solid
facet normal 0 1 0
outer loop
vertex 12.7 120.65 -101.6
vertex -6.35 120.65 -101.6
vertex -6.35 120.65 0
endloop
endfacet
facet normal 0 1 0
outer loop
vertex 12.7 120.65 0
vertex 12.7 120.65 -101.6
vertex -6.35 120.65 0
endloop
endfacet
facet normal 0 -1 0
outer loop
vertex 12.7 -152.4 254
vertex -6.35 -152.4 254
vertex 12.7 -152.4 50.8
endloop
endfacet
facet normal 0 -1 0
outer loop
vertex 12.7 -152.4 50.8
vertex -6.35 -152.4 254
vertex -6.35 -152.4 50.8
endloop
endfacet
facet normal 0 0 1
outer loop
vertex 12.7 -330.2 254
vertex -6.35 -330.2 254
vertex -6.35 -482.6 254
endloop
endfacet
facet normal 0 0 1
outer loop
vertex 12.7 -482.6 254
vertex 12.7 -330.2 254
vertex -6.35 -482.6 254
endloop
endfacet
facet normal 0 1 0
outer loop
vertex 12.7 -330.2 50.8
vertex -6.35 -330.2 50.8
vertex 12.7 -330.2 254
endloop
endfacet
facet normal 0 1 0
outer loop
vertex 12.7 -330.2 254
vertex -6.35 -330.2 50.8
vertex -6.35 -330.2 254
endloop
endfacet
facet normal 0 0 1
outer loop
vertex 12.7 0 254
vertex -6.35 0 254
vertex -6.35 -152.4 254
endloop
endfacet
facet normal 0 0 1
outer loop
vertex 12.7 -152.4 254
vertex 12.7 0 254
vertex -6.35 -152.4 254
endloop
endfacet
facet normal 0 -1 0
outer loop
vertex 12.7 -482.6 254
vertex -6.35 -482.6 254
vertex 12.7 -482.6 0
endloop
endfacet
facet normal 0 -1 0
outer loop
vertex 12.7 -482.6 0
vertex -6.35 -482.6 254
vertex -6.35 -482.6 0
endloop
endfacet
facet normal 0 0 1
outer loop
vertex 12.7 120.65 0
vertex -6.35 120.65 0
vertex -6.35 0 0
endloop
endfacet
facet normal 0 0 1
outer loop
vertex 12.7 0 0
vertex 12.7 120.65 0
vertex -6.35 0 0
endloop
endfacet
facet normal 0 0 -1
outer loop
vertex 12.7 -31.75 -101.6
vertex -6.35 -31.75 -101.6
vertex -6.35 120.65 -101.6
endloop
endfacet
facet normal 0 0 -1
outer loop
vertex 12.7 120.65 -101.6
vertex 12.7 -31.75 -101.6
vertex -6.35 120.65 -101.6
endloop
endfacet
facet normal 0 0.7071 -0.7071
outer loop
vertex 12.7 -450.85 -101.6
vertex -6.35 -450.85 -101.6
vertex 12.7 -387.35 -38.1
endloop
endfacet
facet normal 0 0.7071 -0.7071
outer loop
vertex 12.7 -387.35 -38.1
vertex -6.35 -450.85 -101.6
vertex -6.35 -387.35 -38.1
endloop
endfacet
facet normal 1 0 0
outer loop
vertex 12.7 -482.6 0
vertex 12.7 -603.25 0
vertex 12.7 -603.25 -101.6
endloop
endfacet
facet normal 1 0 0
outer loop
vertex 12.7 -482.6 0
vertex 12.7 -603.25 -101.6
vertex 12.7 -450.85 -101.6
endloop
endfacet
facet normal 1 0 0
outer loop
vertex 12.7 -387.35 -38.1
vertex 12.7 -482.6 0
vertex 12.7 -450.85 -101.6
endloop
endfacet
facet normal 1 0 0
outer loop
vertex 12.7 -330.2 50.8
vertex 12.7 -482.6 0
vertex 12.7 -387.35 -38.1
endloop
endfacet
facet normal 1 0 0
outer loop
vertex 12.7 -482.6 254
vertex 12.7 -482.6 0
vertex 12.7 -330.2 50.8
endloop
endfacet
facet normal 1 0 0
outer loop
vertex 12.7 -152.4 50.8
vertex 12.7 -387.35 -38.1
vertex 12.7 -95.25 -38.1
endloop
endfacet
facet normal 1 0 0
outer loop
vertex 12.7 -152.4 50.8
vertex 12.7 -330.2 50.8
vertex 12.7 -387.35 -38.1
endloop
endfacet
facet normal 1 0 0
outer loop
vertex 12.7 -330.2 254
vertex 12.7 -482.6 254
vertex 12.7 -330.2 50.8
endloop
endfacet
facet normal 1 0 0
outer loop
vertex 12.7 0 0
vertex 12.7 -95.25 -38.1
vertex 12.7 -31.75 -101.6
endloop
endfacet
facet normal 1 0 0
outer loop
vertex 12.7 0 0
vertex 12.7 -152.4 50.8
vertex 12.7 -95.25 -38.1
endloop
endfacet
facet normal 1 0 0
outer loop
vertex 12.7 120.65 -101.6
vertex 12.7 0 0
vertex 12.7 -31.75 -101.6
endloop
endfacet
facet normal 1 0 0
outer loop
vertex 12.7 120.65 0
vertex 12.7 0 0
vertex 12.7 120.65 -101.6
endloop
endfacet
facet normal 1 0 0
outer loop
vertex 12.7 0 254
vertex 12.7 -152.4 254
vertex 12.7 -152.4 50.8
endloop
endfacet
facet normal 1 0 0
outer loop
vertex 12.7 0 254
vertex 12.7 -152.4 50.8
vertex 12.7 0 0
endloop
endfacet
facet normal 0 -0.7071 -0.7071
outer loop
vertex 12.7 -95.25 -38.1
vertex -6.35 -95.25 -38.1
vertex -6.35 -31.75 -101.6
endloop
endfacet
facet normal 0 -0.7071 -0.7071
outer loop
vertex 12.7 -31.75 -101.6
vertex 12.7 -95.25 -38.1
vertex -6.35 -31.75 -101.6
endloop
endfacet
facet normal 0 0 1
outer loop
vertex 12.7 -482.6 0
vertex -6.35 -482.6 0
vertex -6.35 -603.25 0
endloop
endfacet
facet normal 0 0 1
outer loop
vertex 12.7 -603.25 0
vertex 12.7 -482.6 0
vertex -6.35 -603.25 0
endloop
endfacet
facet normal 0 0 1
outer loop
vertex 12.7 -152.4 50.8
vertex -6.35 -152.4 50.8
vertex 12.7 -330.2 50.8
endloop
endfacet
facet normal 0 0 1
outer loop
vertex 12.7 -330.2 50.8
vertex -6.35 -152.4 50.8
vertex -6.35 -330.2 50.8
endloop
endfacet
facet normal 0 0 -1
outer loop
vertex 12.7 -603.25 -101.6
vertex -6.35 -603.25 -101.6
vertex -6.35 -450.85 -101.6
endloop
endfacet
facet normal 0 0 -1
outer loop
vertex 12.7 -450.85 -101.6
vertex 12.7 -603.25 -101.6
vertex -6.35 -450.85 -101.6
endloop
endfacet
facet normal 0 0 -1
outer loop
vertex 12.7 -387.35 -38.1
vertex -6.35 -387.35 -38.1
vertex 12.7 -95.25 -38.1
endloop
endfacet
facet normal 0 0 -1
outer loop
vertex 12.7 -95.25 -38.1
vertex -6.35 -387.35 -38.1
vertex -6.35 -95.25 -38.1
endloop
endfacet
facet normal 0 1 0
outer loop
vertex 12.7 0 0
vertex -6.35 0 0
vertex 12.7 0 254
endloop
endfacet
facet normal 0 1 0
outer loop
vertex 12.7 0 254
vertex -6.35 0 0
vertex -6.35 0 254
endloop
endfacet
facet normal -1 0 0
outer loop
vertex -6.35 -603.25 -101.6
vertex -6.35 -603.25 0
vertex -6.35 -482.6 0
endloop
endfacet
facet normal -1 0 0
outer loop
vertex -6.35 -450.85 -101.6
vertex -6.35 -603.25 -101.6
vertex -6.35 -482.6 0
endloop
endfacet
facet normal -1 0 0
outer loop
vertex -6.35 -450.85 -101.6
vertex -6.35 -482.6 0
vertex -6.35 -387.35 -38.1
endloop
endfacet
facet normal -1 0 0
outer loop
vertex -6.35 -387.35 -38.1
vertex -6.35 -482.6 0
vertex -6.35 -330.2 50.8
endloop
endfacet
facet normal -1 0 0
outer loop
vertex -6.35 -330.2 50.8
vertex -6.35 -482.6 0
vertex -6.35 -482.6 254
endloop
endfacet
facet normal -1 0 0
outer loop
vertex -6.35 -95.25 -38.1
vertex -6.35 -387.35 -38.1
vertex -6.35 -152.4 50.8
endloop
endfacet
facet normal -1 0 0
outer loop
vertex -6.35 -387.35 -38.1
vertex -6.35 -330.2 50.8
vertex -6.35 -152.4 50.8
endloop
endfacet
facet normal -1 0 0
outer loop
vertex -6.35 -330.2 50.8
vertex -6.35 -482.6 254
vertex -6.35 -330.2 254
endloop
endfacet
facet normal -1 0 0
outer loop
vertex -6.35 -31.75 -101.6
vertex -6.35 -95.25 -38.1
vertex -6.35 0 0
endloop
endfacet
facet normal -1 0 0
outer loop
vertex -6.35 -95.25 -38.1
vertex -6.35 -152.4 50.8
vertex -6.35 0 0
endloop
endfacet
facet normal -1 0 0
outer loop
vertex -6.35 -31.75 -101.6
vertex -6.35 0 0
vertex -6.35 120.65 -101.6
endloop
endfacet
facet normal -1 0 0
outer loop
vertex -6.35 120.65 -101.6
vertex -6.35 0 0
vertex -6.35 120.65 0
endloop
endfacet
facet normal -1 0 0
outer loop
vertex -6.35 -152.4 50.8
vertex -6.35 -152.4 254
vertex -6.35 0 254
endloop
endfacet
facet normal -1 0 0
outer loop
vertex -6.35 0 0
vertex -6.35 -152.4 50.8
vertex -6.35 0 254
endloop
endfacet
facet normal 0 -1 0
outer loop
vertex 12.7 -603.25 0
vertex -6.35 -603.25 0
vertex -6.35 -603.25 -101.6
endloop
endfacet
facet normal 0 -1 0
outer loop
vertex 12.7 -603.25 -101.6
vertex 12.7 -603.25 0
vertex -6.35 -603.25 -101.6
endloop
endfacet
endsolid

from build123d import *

# Parameters (mm, degrees)
F1_DEPTH = 6.35
F2_DEPTH = 12.7


with BuildPart() as f1:
    # F0 (on Right) → F1 (new body, symmetric)
    with BuildSketch(Plane.YZ):
        Polygon((0, 0), (0, 254), (-152.4, 254), (-152.4, 50.8), (-330.2, 50.8), (-330.2, 254), (-482.6, 254), (-482.6, 0), (-603.25, 0), (-603.25, -101.6), (-450.85, -101.6), (-387.35, -38.1), (-95.25, -38.1), (-31.75, -101.6), (120.65, -101.6), (120.65, 0), align=None)
    extrude(amount=F1_DEPTH, both=True)

    # F0 (on Right) → F2 (join)
    with BuildSketch(Plane.YZ):
        Polygon((0, 0), (0, 254), (-152.4, 254), (-152.4, 50.8), (-330.2, 50.8), (-330.2, 254), (-482.6, 254), (-482.6, 0), (-603.25, 0), (-603.25, -101.6), (-450.85, -101.6), (-387.35, -38.1), (-95.25, -38.1), (-31.75, -101.6), (120.65, -101.6), (120.65, 0), align=None)
    extrude(amount=F2_DEPTH)


solid = f1.part
